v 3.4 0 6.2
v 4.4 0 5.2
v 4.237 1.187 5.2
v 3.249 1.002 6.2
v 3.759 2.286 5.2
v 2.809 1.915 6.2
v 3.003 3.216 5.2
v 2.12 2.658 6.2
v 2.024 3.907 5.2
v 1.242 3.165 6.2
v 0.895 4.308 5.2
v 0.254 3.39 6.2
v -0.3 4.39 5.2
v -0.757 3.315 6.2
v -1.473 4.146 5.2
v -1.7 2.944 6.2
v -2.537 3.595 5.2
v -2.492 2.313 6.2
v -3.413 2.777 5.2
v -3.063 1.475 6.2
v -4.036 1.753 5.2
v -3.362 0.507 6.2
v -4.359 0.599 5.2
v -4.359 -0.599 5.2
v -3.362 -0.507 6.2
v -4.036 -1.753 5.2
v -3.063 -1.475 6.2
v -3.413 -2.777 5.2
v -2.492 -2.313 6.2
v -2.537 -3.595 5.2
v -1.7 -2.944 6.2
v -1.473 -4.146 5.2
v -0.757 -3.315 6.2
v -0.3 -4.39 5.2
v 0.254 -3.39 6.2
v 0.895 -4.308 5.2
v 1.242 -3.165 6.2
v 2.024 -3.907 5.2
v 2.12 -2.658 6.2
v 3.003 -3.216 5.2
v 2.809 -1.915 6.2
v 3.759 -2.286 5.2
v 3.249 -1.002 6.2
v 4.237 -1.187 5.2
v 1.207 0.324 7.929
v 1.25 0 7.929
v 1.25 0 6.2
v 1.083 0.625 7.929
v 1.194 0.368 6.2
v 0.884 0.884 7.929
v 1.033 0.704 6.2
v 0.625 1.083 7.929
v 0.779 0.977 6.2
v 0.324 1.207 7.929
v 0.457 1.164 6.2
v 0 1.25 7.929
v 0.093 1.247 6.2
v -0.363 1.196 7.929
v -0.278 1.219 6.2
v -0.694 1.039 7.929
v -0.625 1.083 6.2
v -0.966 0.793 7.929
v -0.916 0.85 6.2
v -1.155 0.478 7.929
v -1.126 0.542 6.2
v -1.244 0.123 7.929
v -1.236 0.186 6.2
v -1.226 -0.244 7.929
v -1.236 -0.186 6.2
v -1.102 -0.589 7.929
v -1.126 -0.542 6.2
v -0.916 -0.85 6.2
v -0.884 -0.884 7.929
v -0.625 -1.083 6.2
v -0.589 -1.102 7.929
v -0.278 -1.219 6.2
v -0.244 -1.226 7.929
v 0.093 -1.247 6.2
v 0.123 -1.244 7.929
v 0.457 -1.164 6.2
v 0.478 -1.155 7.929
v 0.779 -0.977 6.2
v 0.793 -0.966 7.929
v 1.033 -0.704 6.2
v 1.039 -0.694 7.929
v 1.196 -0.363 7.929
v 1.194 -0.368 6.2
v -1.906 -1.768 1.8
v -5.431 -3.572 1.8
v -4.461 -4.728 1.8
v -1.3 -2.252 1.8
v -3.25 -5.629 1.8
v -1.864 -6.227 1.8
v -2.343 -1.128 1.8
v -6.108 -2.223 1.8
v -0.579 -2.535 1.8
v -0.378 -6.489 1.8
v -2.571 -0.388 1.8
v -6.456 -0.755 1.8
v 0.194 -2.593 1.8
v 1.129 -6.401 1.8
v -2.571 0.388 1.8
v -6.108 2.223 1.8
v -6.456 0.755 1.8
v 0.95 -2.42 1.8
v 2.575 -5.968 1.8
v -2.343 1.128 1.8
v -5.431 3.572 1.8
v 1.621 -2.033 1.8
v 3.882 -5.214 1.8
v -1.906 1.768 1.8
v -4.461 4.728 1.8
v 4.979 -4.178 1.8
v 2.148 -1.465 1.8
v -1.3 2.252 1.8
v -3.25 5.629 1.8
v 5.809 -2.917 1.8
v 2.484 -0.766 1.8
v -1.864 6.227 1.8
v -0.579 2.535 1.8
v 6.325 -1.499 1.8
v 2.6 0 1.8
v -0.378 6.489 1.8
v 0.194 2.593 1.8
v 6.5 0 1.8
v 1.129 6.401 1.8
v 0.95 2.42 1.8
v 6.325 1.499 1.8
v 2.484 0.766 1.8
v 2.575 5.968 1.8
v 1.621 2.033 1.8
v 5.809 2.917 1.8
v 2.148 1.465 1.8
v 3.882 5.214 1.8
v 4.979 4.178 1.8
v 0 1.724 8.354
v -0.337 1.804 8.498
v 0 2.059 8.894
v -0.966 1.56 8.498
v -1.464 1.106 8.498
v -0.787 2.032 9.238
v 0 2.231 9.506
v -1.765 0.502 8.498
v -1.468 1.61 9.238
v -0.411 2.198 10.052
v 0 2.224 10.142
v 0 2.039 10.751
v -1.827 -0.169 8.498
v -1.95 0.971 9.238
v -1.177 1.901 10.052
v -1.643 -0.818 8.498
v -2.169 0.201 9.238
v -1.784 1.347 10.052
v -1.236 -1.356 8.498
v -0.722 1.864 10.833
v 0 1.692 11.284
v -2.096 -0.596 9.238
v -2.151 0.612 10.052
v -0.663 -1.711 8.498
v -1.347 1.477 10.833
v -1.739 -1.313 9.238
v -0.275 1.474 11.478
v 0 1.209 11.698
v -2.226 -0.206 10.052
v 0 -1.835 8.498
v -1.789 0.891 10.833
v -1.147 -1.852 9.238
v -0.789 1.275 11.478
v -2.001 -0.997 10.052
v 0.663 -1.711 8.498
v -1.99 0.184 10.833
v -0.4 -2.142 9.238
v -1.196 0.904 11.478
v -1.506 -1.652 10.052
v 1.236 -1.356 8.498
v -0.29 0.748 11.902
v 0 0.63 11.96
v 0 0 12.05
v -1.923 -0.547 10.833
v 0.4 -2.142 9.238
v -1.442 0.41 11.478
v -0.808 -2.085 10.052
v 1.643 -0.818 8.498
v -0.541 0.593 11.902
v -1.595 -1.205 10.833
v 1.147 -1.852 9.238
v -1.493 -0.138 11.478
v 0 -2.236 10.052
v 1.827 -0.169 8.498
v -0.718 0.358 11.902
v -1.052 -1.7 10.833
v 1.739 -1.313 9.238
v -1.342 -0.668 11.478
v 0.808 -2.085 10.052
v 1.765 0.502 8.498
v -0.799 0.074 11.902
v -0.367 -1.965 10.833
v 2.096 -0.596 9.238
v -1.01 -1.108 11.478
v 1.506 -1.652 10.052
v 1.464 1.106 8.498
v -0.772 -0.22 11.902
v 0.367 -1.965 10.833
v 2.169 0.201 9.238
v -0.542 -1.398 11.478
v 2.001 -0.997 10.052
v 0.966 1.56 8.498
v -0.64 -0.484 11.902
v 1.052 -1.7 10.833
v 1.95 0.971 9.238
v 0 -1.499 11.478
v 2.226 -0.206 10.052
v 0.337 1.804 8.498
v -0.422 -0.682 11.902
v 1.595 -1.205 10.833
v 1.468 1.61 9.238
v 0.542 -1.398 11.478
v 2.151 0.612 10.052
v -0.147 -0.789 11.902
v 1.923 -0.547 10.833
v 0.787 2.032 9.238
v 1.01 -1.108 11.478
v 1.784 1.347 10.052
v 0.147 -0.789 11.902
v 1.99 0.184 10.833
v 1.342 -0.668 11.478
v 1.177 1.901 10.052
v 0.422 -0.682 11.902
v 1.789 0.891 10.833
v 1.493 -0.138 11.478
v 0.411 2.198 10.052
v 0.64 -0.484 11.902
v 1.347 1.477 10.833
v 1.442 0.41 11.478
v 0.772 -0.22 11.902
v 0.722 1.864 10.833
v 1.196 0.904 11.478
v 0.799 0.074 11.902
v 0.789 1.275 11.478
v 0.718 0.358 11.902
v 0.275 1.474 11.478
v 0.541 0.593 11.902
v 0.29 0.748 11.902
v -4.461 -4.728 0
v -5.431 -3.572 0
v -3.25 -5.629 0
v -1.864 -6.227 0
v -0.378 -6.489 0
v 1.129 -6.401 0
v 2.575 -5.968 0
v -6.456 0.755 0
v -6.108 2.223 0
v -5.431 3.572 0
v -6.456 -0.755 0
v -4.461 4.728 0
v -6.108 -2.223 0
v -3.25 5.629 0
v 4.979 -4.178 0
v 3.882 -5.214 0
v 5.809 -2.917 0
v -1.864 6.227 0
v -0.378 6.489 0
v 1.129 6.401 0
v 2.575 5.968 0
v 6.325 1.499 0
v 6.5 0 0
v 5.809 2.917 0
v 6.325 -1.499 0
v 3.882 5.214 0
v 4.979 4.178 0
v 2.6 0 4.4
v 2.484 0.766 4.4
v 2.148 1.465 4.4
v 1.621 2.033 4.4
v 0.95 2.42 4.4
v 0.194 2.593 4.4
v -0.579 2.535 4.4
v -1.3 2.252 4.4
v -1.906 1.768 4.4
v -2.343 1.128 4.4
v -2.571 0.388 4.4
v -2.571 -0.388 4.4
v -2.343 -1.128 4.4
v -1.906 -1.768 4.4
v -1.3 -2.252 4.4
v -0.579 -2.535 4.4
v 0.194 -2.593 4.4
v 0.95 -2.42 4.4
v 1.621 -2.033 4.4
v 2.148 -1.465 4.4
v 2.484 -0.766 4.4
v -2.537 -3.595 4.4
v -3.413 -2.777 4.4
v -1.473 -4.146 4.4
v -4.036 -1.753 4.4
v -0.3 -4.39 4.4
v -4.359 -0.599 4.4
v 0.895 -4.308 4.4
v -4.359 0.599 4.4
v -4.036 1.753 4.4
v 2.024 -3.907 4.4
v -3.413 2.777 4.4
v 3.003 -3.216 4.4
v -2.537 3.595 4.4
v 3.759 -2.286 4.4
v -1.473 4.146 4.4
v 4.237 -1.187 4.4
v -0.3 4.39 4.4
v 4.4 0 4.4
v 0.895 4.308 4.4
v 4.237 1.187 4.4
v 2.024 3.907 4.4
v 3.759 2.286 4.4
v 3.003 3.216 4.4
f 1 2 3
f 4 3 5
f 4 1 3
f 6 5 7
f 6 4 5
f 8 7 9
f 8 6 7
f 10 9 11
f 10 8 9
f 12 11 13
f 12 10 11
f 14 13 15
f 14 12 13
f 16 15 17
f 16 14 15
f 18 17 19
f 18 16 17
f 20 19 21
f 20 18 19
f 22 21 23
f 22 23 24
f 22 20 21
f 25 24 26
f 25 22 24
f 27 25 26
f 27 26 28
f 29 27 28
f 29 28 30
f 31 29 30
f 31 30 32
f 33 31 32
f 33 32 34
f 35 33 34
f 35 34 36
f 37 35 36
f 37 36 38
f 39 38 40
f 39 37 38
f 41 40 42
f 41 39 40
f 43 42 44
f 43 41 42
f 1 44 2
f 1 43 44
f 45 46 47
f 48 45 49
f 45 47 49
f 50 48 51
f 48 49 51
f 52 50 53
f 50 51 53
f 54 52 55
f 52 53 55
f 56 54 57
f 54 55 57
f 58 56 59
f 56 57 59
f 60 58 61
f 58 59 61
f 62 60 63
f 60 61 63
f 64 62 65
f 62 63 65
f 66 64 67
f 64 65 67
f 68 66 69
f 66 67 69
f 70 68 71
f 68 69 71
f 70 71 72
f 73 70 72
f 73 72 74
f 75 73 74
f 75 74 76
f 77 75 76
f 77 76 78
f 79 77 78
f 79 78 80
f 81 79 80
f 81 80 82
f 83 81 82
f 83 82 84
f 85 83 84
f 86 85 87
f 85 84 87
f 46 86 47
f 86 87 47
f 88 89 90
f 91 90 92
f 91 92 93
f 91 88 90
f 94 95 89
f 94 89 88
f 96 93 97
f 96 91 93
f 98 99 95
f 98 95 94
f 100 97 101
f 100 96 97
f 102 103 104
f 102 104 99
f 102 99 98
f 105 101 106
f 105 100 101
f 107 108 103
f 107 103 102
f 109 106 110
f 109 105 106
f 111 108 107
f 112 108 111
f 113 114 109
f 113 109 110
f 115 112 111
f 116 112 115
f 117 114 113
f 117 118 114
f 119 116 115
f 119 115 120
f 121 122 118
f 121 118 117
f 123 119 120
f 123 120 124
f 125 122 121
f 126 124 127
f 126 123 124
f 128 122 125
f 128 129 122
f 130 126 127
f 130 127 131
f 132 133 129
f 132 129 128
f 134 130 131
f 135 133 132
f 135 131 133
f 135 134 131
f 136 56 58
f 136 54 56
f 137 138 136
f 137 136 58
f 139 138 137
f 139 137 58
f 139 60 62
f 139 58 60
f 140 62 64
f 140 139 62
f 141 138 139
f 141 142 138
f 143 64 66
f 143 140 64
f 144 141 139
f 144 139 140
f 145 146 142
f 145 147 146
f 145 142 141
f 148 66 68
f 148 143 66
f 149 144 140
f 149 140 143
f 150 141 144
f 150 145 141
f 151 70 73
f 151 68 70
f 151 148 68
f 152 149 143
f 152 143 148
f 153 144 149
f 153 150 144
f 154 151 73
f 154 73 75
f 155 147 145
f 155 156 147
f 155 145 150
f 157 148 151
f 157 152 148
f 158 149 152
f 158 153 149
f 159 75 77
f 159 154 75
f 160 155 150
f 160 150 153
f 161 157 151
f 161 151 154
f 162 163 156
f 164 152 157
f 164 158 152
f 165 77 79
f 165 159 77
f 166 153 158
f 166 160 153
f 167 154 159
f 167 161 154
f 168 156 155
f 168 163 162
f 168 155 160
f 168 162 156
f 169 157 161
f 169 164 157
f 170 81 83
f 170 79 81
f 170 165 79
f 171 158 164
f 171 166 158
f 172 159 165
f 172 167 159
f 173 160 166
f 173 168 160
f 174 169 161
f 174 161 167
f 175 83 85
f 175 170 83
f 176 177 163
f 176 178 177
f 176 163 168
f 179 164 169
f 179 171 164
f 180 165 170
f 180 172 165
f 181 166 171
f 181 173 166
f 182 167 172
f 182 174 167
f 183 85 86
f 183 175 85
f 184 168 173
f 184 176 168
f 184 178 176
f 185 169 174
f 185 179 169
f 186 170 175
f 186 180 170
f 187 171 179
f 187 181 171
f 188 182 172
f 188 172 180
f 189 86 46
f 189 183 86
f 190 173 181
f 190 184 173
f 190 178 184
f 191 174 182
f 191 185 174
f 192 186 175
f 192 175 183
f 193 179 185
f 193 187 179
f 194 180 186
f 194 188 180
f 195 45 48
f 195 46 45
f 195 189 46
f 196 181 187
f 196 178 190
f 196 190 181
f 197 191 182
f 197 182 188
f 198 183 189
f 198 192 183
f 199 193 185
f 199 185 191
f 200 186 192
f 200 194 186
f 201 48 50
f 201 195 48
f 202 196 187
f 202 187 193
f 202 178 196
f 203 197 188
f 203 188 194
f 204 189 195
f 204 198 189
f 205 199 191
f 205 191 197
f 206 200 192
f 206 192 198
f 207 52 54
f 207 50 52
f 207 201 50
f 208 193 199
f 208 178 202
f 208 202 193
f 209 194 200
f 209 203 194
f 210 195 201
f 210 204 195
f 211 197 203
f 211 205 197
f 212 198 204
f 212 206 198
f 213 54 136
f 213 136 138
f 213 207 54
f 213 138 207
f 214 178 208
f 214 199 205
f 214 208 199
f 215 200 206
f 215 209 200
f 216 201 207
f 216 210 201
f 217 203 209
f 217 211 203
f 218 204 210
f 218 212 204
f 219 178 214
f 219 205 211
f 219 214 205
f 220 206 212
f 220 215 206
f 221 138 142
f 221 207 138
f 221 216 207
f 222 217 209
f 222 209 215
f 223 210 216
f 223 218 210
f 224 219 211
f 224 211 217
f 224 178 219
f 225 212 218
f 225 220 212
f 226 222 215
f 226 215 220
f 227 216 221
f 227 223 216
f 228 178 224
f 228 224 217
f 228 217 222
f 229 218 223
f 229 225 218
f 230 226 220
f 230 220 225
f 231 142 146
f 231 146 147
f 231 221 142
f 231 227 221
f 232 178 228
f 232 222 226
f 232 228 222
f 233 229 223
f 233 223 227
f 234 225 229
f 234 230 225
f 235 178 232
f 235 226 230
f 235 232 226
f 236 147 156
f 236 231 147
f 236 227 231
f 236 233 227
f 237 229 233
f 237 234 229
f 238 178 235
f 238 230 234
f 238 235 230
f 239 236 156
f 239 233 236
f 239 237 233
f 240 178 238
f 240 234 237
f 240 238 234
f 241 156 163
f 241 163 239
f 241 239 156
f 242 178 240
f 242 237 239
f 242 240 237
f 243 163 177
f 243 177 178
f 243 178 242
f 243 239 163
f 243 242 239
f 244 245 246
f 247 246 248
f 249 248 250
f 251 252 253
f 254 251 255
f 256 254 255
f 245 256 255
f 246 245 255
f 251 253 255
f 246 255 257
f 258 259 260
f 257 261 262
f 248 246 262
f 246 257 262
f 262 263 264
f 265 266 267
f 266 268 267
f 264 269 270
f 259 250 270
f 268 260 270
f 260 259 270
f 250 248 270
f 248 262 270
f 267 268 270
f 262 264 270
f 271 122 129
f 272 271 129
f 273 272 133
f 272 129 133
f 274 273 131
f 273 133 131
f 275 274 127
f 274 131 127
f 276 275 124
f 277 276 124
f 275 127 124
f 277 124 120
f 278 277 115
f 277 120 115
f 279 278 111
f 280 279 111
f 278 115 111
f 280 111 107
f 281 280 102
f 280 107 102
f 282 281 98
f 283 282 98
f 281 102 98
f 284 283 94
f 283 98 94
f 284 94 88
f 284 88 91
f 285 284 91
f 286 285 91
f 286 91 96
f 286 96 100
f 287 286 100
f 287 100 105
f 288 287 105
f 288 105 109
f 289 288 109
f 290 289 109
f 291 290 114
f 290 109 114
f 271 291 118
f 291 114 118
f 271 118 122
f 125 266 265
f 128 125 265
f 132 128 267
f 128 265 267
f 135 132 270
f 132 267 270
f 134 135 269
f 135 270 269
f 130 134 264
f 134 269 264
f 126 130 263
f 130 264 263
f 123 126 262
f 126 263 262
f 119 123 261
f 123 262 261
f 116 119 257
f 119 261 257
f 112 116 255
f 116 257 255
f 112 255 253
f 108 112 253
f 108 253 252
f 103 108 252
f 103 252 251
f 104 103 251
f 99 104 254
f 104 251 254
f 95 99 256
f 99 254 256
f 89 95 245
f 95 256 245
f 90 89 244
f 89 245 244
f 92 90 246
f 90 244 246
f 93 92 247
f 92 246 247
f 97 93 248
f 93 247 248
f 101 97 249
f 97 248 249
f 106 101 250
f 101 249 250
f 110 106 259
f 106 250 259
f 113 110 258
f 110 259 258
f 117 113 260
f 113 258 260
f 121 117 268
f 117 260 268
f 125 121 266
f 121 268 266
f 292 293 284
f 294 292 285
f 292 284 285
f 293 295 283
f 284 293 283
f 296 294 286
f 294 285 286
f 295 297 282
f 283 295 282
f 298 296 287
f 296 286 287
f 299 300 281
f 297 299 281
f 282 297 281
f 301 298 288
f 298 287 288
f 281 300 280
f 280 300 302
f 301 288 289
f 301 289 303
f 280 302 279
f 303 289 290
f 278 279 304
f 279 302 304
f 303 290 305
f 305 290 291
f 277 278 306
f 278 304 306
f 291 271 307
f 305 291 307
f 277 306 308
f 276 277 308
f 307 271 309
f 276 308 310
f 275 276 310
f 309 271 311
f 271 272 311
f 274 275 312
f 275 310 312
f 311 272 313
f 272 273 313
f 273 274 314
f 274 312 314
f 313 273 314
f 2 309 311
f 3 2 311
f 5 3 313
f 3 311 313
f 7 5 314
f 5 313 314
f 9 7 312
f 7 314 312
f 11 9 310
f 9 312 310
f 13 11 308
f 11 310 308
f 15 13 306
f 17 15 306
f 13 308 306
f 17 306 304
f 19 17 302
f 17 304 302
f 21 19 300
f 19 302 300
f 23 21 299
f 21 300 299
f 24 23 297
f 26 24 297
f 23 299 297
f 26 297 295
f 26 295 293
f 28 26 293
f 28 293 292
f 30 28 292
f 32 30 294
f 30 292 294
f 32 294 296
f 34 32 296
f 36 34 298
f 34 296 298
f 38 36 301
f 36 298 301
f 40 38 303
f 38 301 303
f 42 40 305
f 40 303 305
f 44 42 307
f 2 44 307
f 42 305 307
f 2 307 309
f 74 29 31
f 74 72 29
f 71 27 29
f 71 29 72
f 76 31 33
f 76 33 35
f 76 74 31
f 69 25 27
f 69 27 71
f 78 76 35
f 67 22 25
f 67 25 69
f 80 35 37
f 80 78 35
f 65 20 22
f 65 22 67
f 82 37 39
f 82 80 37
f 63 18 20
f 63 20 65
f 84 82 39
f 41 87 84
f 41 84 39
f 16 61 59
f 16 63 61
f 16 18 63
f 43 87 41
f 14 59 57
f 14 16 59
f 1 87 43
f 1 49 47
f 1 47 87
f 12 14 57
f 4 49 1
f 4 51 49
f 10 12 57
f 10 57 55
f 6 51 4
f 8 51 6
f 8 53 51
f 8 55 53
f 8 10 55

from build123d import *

# Parameters (mm, degrees)
F0_R     = 6.5
F1_DEPTH = 1.8
F2_R     = 2.6
F4_DEPTH = 2.6
F5_R     = 4.4
F6_DEPTH = 1.8
F7_SIZE  = 1
F8_R     = 1.25
F9_DEPTH = 1.8


with BuildPart() as f1:
    # F0 (on Top) → F1 (new body)
    with BuildSketch(Plane.XY):
        Circle(F0_R)
    extrude(amount=F1_DEPTH)

    # F2 (on face) → F4 (join)
    with BuildSketch(Plane.XY.offset(1.8)):
        Circle(F2_R)
    extrude(amount=F4_DEPTH)

    # F5 (on face) → F6 (join, through all)
    with BuildSketch(Plane.XY.offset(4.4)):
        Circle(F5_R)
    extrude(amount=F6_DEPTH)

    # F7
    f7_edges = [f1.edges().sort_by_distance(p)[0] for p in [
        (-4.4, 0, 6.2),
    ]]
    chamfer(f7_edges, length=F7_SIZE)

    # F8 (on face) → F9 (join)
    with BuildSketch(Plane.XY.offset(6.2)):
        Circle(F8_R)
    extrude(amount=F9_DEPTH)

    # F10 (on Right) → F11 (revolve)
    with BuildSketch(Plane.YZ):
        with BuildLine():
            Line((0, 12.05), (0, 7.55))
            ThreePointArc((0, 7.55), (2.25, 9.8), (0, 12.05))
        make_face()
    revolve(axis=Axis((0, 0, 9.8), (0, 0, 1)))


solid = f1.part
